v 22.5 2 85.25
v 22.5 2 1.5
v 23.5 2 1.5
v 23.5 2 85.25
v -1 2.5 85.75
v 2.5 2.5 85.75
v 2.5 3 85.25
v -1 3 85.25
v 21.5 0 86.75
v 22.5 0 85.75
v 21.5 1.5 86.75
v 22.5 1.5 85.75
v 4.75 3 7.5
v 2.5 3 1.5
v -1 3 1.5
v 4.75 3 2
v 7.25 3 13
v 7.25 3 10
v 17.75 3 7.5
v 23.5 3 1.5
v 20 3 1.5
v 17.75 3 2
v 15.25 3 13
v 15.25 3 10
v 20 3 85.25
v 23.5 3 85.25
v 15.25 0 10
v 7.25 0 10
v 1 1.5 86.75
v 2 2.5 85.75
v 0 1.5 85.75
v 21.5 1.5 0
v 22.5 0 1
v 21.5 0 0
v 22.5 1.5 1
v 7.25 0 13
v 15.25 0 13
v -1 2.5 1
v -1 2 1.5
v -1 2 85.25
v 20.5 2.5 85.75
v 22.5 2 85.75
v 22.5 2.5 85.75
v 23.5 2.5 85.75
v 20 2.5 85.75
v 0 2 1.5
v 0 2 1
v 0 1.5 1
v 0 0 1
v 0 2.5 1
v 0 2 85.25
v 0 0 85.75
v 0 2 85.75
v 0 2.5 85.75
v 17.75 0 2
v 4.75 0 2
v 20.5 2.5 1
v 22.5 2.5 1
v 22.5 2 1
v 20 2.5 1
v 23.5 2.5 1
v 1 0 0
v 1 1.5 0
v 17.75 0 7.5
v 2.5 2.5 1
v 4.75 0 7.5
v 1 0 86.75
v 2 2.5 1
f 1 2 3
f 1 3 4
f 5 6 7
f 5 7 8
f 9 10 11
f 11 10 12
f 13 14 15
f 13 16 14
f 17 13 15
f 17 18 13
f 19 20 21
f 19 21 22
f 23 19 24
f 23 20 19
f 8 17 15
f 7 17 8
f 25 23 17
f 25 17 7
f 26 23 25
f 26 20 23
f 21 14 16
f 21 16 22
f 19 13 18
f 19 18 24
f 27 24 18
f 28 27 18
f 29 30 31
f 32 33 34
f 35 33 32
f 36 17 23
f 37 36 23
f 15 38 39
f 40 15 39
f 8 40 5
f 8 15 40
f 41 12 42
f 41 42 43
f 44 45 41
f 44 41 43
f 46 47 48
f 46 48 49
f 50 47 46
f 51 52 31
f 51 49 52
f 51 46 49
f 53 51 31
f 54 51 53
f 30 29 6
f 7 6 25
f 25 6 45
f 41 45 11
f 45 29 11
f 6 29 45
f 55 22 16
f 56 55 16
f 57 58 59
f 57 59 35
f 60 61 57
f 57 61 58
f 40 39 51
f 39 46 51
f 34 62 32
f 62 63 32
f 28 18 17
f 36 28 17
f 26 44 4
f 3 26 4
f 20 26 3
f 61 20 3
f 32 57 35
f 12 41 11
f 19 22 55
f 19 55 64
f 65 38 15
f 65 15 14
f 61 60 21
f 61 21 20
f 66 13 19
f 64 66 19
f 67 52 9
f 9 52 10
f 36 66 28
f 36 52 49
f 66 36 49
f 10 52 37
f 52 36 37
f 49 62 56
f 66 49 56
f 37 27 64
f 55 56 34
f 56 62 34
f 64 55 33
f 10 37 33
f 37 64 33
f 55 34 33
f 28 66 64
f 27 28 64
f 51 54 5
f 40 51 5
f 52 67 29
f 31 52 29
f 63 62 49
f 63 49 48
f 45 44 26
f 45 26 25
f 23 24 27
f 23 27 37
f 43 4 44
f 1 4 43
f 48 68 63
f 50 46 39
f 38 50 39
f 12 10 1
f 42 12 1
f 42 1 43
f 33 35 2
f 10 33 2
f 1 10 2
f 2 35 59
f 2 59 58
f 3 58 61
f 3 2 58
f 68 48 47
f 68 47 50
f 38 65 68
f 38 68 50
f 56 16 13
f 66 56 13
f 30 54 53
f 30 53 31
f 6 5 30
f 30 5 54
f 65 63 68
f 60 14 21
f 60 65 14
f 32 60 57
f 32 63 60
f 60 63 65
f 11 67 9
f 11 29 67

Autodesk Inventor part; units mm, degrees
ref_plane "YZ Plane" through (0, 0, 0) normal (1, 0, 0) x (0, 1, 0)
ref_plane "XZ Plane" through (0, 0, 0) normal (0, 1, 0) x (-1, 0, 0)
ref_plane "XY Plane" through (0, 0, 0) normal (0, 0, 1) x (1, 0, 0)
sketch "Sketch1" plane through (0, 0, 0) normal (0, 0, 1) x (1, 0, 0)
  line L0 (0, 0) -> (22.5, 0)
  line L1 (22.5, 0) -> (22.5, 3)
  line L2 (22.5, 3) -> (0, 3)
  line L3 (0, 3) -> (0, 0)
  dimension "d0" = 22.5
  dimension "d1" = 3
extrude "Extrusion1" add sketch "Sketch1" along normal blind 86.75
sketch "Sketch2" plane through (0, 3, 0) normal (0, 1, 0) x (1, 0, 0)
  line L0 (0, 0) -> (22.5, 0) projected
  line L1 (11.25, 0) -> (11.25, -2)
  line L2 (11.25, 0) -> (13.25, 0) construction
  line L3 (11.25, -2) -> (4.75, -2)
  line L4 (4.75, -2) -> (4.75, -7.5)
  line L5 (4.75, -7.5) -> (11.25, -7.5)
  line L6 (11.25, -7.5) -> (11.25, -2)
  line L7 (11.25, -2) -> (17.75, -2)
  line L8 (17.75, -2) -> (17.75, -7.5)
  line L9 (17.75, -7.5) -> (11.25, -7.5)
  line L10 (11.25, -7.5) -> (11.25, -2)
  dimension "d4" = 2
  dimension "d5" = 90
  dimension "d6" = 6.5
  dimension "d7" = 5.5
  dimension "d8" = 6.5
  dimension "d9" = 5.5
extrude "Extrusion2" cut sketch "Sketch2" against normal blind 3
sketch "Sketch3" plane through (0, 3, 0) normal (0, 1, 0) x (1, 0, 0)
  line L0 (4.75, -7.5) -> (17.75, -7.5) projected
  line L1 (11.25, -7.5) -> (11.25, -10)
  line L2 (11.25, -7.5) -> (13.75, -7.5) construction
  line L3 (11.25, -10) -> (7.25, -10)
  line L4 (7.25, -10) -> (7.25, -13)
  line L5 (7.25, -13) -> (11.25, -13)
  line L6 (11.25, -13) -> (11.25, -10)
  line L7 (11.25, -10) -> (15.25, -10)
  line L8 (15.25, -10) -> (15.25, -13)
  line L9 (15.25, -13) -> (11.25, -13)
  line L10 (11.25, -13) -> (11.25, -10)
  point P0 (0, 0)
  dimension "d12" = 2.5
  dimension "d13" = 90
  dimension "d14" = 4
  dimension "d15" = 3
  dimension "d16" = 4
  dimension "d17" = 3
extrude "Extrusion3" cut sketch "Sketch3" against normal blind 3
sketch "Sketch4" plane through (0, 3, 0) normal (0, 1, 0) x (1, 0, 0)
  point P0 (0, 0)
chamfer "Chamfer1" distance 1.5 angle 45 4 edges at (22.5, 3, 43.375) (11.25, 3, 86.75) (0, 3, 43.375) (11.25, 3, 0)
chamfer "Chamfer2" distance 1 angle 45 4 edges at (0, 0.75, 86.75) (22.5, 0.75, 86.75) (22.5, 0.75, 0) (0, 0.75, 0)
chamfer "Chamfer3" distance 0.8165 angle 45 4 edges at (1, 2.5, 1) (21.5, 2.5, 1) (1, 2.5, 85.75) (21.5, 2.5, 85.75)
sketch "Sketch5" plane through (22.5, 0, 85.75) normal (1, 0, 0) x (0, 0, -1)
  line L0 (83.25, 3) -> (84.75, 1.5) projected
  line L1 (84.75, 1.5) -> (0, 1.5)
  line L2 (0, 1.5) -> (0, 3)
  line L3 (0, 3) -> (84.75, 3)
  line L4 (84.75, 3) -> (84.75, 1.5)
  point P0 (85.75, 0)
  dimension "d29" = 84.75
  dimension "d30" = 1.5
extrude "Extrusion4" add sketch "Sketch5" against normal blind 2.5
sketch "Sketch6" plane through (22.5, 0, 85.75) normal (1, 0, 0) x (0, 0, -1)
  line L0 (0, 3) -> (84.75, 3) projected
  line L1 (0, 3) -> (84.75, 3)
  line L2 (84.75, 3) -> (84.75, 2)
  line L3 (84.75, 2) -> (0, 2)
  line L4 (0, 2) -> (0, 3)
  point P0 (85.75, 0)
  dimension "d33" = 84.75
  dimension "d34" = 1
extrude "Extrusion5" add sketch "Sketch6" along normal blind 1
sketch "Sketch7" plane through (0, 0, 1) normal (-1, 0, 0) x (0, 0, 1)
  line L0 (0, 1.5) -> (1.5, 3) projected
  line L1 (0, 1.5) -> (84.75, 1.5)
  line L2 (84.75, 1.5) -> (84.75, 3)
  line L3 (84.75, 3) -> (0, 3)
  line L4 (0, 3) -> (0, 1.5)
  point P0 (-1, 0)
  dimension "d37" = 84.75
  dimension "d38" = 1.5
extrude "Extrusion6" add sketch "Sketch7" against normal blind 2.5
sketch "Sketch8" plane through (0, 0, 1) normal (-1, 0, 0) x (0, 0, 1)
  line L0 (0, 3) -> (0.5, 3) projected
  line L1 (0, 2) -> (84.75, 2) projected
  line L2 (0, 3) -> (84.75, 3)
  line L3 (84.75, 3) -> (84.75, 2)
  line L4 (84.75, 2) -> (0, 2)
  line L5 (0, 2) -> (0, 3)
  point P0 (-1, 0)
  dimension "d41" = 84.75
  dimension "d42" = 1
extrude "Extrusion7" add sketch "Sketch8" along normal blind 1
chamfer "Chamfer4" distance 0.5 angle 45 8 edges at (21.75, 3, 85.75) (23, 2, 85.75) (0.75, 3, 85.75) (-0.5, 2, 85.75) (0.75, 3, 1) (-0.5, 2, 1) (21.75, 3, 1) (23, 2, 1)
properties part number "Battery-Management-Case-Cover"
